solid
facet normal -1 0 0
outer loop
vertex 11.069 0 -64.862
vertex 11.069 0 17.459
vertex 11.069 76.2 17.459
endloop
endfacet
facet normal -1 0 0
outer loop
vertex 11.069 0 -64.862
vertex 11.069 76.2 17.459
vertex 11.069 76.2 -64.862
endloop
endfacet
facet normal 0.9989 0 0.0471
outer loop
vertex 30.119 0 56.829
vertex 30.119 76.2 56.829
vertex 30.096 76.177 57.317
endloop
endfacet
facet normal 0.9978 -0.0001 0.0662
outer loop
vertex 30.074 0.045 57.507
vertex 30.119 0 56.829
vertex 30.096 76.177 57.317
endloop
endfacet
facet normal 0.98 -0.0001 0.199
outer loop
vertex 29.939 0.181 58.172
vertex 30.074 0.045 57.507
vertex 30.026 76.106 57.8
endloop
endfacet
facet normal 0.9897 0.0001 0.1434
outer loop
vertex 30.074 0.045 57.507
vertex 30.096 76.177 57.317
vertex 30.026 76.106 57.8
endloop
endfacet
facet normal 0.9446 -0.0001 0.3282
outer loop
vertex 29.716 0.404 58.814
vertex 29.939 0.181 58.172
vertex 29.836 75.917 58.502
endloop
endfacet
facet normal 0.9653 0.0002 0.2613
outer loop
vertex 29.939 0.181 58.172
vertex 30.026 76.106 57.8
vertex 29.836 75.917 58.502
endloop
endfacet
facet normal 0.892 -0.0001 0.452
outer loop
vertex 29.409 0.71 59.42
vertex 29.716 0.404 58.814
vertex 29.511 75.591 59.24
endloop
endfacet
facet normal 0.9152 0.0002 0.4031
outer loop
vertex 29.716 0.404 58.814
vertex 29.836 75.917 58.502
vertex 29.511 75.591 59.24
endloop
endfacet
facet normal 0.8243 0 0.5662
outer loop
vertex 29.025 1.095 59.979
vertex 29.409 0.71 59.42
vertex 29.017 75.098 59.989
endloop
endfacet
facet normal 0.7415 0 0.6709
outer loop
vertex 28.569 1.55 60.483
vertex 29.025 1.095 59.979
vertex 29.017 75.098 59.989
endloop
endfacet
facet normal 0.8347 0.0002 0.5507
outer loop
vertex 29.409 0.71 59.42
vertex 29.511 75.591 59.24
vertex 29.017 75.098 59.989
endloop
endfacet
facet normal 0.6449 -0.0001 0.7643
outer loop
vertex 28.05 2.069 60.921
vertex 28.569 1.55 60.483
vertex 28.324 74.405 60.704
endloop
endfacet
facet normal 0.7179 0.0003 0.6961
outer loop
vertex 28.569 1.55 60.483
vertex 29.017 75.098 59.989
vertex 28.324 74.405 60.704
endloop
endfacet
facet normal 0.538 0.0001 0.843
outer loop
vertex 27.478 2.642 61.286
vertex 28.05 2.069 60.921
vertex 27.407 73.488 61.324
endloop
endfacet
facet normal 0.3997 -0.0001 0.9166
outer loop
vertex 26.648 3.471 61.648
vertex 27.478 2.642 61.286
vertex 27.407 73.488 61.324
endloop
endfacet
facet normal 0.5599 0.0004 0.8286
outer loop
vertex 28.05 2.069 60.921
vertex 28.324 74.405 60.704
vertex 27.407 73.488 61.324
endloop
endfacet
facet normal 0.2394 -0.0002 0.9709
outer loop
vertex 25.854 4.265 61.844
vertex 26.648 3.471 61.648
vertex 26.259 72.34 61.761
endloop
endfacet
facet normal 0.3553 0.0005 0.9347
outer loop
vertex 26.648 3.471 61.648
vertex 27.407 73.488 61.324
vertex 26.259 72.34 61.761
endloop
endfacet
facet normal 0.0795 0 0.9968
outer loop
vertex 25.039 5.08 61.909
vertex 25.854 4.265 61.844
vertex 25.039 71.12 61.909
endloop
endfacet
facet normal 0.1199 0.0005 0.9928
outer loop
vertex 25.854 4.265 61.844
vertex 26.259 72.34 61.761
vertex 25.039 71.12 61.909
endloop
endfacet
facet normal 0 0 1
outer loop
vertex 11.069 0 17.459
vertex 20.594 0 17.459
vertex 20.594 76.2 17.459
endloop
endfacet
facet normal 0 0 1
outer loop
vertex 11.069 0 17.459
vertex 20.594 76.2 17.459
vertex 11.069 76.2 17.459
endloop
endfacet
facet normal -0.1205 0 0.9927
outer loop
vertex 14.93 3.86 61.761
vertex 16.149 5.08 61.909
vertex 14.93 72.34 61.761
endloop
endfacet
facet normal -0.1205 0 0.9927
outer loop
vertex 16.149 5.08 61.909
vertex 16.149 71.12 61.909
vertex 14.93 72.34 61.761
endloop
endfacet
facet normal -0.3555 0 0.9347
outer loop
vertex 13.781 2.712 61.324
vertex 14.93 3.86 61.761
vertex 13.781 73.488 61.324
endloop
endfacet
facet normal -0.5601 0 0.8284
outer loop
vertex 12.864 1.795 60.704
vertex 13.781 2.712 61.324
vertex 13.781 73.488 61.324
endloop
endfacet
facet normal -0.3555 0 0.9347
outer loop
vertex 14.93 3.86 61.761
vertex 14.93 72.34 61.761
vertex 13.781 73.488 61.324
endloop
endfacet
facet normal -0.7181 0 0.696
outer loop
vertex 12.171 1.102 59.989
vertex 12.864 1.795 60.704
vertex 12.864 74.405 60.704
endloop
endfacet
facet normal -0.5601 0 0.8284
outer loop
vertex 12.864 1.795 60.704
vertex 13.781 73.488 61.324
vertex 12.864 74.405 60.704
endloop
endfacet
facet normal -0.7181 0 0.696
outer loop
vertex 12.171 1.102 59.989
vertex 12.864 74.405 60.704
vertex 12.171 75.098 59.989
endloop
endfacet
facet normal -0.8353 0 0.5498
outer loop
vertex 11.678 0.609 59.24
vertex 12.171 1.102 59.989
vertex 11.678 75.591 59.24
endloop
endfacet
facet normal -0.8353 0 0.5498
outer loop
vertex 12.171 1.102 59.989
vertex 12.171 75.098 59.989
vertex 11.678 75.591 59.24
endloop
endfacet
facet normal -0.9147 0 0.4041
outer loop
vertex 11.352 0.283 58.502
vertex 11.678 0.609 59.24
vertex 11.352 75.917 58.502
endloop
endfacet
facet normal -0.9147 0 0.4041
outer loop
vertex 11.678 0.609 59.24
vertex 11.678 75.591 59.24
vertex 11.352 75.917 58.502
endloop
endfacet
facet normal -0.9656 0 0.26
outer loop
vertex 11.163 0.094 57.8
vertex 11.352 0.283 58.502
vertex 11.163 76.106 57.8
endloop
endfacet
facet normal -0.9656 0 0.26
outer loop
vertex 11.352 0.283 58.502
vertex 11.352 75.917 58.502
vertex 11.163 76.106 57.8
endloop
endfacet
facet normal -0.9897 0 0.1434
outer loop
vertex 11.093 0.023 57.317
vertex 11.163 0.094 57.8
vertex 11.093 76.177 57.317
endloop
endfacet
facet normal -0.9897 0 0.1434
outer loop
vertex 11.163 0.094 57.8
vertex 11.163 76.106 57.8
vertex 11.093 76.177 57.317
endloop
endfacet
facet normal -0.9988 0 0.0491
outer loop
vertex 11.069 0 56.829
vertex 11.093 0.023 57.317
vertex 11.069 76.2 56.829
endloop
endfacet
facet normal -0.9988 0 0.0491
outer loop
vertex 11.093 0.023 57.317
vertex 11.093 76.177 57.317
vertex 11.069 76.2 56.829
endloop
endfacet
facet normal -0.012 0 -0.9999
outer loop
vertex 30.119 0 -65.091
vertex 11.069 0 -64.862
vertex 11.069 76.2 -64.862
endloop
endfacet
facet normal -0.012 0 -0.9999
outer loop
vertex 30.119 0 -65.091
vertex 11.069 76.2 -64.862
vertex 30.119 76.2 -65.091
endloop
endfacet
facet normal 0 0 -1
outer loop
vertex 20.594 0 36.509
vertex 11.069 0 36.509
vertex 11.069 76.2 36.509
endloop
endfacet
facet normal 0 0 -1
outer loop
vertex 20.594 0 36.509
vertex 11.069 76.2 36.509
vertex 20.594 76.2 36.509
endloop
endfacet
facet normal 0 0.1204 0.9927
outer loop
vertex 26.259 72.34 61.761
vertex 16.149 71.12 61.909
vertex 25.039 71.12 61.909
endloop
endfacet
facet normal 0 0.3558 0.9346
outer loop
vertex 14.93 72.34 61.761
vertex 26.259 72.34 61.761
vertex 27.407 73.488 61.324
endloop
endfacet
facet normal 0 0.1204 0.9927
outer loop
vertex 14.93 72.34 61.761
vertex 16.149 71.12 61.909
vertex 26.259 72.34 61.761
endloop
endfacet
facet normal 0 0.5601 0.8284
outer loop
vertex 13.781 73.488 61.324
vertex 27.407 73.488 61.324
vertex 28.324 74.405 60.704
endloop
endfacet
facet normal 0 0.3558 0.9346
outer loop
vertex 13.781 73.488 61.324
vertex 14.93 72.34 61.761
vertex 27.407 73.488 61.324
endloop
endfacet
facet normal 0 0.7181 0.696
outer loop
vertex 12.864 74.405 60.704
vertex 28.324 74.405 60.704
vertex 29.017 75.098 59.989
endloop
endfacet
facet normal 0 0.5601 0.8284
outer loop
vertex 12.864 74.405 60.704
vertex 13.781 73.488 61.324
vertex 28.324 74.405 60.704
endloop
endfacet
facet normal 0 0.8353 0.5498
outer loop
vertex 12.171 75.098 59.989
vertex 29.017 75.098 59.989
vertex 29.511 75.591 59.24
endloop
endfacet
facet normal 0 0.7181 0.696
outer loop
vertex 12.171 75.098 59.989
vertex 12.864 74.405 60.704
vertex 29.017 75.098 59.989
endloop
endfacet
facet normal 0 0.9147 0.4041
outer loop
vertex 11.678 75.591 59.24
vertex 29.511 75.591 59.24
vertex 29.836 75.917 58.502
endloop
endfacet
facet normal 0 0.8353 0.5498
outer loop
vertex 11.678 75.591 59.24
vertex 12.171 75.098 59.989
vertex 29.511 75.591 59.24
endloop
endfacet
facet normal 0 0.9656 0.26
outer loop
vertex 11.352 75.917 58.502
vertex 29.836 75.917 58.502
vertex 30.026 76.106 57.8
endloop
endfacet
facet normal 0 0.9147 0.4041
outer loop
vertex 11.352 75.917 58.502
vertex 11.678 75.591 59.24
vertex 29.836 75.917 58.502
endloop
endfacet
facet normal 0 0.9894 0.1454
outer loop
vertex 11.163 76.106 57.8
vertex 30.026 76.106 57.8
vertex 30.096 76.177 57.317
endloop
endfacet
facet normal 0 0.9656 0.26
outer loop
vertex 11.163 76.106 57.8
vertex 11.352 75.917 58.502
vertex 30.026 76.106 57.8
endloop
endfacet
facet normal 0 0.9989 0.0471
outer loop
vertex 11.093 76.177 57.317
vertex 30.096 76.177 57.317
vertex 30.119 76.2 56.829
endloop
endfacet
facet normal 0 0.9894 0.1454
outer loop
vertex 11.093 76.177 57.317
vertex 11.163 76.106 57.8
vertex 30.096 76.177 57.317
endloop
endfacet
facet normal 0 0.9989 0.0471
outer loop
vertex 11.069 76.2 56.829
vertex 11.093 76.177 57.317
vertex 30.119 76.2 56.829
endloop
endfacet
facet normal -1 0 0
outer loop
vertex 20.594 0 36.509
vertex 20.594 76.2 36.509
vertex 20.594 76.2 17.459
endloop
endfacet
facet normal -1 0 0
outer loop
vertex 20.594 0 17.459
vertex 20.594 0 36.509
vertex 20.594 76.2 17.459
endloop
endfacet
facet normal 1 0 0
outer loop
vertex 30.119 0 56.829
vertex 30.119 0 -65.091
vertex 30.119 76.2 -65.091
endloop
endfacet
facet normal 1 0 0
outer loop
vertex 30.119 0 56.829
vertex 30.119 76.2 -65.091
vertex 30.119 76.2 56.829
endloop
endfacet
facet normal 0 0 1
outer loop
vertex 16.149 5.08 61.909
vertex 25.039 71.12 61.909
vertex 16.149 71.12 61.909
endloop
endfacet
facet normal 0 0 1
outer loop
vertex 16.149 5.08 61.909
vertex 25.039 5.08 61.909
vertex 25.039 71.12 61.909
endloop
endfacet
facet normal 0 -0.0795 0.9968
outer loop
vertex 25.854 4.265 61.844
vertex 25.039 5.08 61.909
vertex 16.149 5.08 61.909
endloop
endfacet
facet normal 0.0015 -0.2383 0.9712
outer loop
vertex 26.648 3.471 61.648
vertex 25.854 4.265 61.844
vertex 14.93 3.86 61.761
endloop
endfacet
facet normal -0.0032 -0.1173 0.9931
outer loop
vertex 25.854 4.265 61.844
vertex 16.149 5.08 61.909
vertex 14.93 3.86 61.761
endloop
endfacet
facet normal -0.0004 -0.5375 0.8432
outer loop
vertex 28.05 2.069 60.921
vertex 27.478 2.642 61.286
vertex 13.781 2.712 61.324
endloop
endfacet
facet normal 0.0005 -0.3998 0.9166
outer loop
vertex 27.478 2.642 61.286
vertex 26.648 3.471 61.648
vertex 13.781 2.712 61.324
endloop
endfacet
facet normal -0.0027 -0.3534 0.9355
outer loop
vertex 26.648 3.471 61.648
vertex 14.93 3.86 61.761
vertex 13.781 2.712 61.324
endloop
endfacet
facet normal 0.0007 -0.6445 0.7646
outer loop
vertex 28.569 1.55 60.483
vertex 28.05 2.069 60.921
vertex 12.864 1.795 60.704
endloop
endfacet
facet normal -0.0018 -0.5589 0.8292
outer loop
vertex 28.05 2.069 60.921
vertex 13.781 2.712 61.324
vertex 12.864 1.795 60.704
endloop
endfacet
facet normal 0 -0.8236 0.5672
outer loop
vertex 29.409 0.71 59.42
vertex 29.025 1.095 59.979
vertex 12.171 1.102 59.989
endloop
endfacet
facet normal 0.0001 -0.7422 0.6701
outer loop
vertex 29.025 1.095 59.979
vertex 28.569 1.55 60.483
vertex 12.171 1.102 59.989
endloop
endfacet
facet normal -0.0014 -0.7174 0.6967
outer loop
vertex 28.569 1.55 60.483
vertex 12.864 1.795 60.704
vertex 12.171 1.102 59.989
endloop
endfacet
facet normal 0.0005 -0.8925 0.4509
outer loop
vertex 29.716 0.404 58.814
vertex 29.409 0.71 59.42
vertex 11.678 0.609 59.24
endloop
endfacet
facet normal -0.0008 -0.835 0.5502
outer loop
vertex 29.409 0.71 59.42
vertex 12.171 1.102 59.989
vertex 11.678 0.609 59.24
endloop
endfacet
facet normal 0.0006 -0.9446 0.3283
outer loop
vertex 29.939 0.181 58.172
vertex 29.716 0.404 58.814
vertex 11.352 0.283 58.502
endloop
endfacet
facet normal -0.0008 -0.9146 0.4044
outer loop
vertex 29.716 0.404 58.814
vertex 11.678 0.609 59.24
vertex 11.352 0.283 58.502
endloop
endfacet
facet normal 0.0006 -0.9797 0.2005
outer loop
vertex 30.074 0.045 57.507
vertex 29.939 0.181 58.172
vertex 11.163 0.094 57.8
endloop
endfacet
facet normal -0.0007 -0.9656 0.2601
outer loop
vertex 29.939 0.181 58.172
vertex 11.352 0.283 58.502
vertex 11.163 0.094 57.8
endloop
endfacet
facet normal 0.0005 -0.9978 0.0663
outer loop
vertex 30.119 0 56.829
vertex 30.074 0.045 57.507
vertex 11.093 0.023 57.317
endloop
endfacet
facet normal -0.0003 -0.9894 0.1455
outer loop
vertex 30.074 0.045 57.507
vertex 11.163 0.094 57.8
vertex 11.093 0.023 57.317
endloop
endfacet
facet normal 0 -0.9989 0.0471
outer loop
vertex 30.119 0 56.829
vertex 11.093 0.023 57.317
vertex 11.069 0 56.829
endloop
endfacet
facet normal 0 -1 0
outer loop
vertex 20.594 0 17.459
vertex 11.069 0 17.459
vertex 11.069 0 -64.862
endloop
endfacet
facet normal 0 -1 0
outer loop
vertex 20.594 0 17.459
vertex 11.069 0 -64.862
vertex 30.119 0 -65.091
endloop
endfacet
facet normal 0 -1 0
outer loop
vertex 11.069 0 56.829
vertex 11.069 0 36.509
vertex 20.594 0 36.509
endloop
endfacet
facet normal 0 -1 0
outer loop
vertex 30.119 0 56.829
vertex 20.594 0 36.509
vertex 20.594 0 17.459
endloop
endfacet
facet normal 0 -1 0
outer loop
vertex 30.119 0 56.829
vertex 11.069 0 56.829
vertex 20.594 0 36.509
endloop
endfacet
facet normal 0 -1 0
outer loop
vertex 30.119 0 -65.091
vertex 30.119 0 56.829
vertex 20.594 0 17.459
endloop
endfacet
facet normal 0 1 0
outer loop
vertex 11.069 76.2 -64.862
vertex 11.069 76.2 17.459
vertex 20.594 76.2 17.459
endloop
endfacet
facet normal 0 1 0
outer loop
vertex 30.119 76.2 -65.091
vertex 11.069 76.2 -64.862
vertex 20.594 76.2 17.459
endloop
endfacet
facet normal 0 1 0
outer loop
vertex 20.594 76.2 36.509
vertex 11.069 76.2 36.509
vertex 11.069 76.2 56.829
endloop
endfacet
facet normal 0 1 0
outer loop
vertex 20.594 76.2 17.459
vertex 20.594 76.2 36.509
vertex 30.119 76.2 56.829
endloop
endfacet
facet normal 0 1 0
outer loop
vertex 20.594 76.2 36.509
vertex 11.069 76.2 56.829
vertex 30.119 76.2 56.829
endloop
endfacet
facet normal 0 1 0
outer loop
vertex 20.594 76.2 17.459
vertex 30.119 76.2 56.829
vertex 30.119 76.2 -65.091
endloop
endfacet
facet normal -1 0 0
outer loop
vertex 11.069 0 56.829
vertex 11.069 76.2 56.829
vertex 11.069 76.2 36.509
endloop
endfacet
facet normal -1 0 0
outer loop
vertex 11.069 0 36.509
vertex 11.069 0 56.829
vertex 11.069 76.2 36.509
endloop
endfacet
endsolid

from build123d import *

# Parameters (mm, degrees)
F1_DEPTH = 76.2
F2_R     = 5.08


with BuildPart() as f1:
    # F0 (on Front) → F1 (new body)
    with BuildSketch(Plane.XZ):
        Polygon((11.069345, -64.862475), (30.119345, -65.090583), (30.119345, 61.909417), (11.069345, 61.909417), (11.069345, 36.509417), (20.594345, 36.509417), (20.594345, 17.459417), (11.069345, 17.459417), align=None)
    extrude(amount=-F1_DEPTH)

    # F2
    f2_edges = [f1.edges().sort_by_distance(p)[0] for p in [
        (20.594345, 76.2, 61.909417),
        (30.119345, 38.1, 61.909417),
        (20.594345, 0, 61.909417),
        (11.069345, 38.1, 61.909417),
    ]]
    fillet(f2_edges, radius=F2_R)


solid = f1.part
